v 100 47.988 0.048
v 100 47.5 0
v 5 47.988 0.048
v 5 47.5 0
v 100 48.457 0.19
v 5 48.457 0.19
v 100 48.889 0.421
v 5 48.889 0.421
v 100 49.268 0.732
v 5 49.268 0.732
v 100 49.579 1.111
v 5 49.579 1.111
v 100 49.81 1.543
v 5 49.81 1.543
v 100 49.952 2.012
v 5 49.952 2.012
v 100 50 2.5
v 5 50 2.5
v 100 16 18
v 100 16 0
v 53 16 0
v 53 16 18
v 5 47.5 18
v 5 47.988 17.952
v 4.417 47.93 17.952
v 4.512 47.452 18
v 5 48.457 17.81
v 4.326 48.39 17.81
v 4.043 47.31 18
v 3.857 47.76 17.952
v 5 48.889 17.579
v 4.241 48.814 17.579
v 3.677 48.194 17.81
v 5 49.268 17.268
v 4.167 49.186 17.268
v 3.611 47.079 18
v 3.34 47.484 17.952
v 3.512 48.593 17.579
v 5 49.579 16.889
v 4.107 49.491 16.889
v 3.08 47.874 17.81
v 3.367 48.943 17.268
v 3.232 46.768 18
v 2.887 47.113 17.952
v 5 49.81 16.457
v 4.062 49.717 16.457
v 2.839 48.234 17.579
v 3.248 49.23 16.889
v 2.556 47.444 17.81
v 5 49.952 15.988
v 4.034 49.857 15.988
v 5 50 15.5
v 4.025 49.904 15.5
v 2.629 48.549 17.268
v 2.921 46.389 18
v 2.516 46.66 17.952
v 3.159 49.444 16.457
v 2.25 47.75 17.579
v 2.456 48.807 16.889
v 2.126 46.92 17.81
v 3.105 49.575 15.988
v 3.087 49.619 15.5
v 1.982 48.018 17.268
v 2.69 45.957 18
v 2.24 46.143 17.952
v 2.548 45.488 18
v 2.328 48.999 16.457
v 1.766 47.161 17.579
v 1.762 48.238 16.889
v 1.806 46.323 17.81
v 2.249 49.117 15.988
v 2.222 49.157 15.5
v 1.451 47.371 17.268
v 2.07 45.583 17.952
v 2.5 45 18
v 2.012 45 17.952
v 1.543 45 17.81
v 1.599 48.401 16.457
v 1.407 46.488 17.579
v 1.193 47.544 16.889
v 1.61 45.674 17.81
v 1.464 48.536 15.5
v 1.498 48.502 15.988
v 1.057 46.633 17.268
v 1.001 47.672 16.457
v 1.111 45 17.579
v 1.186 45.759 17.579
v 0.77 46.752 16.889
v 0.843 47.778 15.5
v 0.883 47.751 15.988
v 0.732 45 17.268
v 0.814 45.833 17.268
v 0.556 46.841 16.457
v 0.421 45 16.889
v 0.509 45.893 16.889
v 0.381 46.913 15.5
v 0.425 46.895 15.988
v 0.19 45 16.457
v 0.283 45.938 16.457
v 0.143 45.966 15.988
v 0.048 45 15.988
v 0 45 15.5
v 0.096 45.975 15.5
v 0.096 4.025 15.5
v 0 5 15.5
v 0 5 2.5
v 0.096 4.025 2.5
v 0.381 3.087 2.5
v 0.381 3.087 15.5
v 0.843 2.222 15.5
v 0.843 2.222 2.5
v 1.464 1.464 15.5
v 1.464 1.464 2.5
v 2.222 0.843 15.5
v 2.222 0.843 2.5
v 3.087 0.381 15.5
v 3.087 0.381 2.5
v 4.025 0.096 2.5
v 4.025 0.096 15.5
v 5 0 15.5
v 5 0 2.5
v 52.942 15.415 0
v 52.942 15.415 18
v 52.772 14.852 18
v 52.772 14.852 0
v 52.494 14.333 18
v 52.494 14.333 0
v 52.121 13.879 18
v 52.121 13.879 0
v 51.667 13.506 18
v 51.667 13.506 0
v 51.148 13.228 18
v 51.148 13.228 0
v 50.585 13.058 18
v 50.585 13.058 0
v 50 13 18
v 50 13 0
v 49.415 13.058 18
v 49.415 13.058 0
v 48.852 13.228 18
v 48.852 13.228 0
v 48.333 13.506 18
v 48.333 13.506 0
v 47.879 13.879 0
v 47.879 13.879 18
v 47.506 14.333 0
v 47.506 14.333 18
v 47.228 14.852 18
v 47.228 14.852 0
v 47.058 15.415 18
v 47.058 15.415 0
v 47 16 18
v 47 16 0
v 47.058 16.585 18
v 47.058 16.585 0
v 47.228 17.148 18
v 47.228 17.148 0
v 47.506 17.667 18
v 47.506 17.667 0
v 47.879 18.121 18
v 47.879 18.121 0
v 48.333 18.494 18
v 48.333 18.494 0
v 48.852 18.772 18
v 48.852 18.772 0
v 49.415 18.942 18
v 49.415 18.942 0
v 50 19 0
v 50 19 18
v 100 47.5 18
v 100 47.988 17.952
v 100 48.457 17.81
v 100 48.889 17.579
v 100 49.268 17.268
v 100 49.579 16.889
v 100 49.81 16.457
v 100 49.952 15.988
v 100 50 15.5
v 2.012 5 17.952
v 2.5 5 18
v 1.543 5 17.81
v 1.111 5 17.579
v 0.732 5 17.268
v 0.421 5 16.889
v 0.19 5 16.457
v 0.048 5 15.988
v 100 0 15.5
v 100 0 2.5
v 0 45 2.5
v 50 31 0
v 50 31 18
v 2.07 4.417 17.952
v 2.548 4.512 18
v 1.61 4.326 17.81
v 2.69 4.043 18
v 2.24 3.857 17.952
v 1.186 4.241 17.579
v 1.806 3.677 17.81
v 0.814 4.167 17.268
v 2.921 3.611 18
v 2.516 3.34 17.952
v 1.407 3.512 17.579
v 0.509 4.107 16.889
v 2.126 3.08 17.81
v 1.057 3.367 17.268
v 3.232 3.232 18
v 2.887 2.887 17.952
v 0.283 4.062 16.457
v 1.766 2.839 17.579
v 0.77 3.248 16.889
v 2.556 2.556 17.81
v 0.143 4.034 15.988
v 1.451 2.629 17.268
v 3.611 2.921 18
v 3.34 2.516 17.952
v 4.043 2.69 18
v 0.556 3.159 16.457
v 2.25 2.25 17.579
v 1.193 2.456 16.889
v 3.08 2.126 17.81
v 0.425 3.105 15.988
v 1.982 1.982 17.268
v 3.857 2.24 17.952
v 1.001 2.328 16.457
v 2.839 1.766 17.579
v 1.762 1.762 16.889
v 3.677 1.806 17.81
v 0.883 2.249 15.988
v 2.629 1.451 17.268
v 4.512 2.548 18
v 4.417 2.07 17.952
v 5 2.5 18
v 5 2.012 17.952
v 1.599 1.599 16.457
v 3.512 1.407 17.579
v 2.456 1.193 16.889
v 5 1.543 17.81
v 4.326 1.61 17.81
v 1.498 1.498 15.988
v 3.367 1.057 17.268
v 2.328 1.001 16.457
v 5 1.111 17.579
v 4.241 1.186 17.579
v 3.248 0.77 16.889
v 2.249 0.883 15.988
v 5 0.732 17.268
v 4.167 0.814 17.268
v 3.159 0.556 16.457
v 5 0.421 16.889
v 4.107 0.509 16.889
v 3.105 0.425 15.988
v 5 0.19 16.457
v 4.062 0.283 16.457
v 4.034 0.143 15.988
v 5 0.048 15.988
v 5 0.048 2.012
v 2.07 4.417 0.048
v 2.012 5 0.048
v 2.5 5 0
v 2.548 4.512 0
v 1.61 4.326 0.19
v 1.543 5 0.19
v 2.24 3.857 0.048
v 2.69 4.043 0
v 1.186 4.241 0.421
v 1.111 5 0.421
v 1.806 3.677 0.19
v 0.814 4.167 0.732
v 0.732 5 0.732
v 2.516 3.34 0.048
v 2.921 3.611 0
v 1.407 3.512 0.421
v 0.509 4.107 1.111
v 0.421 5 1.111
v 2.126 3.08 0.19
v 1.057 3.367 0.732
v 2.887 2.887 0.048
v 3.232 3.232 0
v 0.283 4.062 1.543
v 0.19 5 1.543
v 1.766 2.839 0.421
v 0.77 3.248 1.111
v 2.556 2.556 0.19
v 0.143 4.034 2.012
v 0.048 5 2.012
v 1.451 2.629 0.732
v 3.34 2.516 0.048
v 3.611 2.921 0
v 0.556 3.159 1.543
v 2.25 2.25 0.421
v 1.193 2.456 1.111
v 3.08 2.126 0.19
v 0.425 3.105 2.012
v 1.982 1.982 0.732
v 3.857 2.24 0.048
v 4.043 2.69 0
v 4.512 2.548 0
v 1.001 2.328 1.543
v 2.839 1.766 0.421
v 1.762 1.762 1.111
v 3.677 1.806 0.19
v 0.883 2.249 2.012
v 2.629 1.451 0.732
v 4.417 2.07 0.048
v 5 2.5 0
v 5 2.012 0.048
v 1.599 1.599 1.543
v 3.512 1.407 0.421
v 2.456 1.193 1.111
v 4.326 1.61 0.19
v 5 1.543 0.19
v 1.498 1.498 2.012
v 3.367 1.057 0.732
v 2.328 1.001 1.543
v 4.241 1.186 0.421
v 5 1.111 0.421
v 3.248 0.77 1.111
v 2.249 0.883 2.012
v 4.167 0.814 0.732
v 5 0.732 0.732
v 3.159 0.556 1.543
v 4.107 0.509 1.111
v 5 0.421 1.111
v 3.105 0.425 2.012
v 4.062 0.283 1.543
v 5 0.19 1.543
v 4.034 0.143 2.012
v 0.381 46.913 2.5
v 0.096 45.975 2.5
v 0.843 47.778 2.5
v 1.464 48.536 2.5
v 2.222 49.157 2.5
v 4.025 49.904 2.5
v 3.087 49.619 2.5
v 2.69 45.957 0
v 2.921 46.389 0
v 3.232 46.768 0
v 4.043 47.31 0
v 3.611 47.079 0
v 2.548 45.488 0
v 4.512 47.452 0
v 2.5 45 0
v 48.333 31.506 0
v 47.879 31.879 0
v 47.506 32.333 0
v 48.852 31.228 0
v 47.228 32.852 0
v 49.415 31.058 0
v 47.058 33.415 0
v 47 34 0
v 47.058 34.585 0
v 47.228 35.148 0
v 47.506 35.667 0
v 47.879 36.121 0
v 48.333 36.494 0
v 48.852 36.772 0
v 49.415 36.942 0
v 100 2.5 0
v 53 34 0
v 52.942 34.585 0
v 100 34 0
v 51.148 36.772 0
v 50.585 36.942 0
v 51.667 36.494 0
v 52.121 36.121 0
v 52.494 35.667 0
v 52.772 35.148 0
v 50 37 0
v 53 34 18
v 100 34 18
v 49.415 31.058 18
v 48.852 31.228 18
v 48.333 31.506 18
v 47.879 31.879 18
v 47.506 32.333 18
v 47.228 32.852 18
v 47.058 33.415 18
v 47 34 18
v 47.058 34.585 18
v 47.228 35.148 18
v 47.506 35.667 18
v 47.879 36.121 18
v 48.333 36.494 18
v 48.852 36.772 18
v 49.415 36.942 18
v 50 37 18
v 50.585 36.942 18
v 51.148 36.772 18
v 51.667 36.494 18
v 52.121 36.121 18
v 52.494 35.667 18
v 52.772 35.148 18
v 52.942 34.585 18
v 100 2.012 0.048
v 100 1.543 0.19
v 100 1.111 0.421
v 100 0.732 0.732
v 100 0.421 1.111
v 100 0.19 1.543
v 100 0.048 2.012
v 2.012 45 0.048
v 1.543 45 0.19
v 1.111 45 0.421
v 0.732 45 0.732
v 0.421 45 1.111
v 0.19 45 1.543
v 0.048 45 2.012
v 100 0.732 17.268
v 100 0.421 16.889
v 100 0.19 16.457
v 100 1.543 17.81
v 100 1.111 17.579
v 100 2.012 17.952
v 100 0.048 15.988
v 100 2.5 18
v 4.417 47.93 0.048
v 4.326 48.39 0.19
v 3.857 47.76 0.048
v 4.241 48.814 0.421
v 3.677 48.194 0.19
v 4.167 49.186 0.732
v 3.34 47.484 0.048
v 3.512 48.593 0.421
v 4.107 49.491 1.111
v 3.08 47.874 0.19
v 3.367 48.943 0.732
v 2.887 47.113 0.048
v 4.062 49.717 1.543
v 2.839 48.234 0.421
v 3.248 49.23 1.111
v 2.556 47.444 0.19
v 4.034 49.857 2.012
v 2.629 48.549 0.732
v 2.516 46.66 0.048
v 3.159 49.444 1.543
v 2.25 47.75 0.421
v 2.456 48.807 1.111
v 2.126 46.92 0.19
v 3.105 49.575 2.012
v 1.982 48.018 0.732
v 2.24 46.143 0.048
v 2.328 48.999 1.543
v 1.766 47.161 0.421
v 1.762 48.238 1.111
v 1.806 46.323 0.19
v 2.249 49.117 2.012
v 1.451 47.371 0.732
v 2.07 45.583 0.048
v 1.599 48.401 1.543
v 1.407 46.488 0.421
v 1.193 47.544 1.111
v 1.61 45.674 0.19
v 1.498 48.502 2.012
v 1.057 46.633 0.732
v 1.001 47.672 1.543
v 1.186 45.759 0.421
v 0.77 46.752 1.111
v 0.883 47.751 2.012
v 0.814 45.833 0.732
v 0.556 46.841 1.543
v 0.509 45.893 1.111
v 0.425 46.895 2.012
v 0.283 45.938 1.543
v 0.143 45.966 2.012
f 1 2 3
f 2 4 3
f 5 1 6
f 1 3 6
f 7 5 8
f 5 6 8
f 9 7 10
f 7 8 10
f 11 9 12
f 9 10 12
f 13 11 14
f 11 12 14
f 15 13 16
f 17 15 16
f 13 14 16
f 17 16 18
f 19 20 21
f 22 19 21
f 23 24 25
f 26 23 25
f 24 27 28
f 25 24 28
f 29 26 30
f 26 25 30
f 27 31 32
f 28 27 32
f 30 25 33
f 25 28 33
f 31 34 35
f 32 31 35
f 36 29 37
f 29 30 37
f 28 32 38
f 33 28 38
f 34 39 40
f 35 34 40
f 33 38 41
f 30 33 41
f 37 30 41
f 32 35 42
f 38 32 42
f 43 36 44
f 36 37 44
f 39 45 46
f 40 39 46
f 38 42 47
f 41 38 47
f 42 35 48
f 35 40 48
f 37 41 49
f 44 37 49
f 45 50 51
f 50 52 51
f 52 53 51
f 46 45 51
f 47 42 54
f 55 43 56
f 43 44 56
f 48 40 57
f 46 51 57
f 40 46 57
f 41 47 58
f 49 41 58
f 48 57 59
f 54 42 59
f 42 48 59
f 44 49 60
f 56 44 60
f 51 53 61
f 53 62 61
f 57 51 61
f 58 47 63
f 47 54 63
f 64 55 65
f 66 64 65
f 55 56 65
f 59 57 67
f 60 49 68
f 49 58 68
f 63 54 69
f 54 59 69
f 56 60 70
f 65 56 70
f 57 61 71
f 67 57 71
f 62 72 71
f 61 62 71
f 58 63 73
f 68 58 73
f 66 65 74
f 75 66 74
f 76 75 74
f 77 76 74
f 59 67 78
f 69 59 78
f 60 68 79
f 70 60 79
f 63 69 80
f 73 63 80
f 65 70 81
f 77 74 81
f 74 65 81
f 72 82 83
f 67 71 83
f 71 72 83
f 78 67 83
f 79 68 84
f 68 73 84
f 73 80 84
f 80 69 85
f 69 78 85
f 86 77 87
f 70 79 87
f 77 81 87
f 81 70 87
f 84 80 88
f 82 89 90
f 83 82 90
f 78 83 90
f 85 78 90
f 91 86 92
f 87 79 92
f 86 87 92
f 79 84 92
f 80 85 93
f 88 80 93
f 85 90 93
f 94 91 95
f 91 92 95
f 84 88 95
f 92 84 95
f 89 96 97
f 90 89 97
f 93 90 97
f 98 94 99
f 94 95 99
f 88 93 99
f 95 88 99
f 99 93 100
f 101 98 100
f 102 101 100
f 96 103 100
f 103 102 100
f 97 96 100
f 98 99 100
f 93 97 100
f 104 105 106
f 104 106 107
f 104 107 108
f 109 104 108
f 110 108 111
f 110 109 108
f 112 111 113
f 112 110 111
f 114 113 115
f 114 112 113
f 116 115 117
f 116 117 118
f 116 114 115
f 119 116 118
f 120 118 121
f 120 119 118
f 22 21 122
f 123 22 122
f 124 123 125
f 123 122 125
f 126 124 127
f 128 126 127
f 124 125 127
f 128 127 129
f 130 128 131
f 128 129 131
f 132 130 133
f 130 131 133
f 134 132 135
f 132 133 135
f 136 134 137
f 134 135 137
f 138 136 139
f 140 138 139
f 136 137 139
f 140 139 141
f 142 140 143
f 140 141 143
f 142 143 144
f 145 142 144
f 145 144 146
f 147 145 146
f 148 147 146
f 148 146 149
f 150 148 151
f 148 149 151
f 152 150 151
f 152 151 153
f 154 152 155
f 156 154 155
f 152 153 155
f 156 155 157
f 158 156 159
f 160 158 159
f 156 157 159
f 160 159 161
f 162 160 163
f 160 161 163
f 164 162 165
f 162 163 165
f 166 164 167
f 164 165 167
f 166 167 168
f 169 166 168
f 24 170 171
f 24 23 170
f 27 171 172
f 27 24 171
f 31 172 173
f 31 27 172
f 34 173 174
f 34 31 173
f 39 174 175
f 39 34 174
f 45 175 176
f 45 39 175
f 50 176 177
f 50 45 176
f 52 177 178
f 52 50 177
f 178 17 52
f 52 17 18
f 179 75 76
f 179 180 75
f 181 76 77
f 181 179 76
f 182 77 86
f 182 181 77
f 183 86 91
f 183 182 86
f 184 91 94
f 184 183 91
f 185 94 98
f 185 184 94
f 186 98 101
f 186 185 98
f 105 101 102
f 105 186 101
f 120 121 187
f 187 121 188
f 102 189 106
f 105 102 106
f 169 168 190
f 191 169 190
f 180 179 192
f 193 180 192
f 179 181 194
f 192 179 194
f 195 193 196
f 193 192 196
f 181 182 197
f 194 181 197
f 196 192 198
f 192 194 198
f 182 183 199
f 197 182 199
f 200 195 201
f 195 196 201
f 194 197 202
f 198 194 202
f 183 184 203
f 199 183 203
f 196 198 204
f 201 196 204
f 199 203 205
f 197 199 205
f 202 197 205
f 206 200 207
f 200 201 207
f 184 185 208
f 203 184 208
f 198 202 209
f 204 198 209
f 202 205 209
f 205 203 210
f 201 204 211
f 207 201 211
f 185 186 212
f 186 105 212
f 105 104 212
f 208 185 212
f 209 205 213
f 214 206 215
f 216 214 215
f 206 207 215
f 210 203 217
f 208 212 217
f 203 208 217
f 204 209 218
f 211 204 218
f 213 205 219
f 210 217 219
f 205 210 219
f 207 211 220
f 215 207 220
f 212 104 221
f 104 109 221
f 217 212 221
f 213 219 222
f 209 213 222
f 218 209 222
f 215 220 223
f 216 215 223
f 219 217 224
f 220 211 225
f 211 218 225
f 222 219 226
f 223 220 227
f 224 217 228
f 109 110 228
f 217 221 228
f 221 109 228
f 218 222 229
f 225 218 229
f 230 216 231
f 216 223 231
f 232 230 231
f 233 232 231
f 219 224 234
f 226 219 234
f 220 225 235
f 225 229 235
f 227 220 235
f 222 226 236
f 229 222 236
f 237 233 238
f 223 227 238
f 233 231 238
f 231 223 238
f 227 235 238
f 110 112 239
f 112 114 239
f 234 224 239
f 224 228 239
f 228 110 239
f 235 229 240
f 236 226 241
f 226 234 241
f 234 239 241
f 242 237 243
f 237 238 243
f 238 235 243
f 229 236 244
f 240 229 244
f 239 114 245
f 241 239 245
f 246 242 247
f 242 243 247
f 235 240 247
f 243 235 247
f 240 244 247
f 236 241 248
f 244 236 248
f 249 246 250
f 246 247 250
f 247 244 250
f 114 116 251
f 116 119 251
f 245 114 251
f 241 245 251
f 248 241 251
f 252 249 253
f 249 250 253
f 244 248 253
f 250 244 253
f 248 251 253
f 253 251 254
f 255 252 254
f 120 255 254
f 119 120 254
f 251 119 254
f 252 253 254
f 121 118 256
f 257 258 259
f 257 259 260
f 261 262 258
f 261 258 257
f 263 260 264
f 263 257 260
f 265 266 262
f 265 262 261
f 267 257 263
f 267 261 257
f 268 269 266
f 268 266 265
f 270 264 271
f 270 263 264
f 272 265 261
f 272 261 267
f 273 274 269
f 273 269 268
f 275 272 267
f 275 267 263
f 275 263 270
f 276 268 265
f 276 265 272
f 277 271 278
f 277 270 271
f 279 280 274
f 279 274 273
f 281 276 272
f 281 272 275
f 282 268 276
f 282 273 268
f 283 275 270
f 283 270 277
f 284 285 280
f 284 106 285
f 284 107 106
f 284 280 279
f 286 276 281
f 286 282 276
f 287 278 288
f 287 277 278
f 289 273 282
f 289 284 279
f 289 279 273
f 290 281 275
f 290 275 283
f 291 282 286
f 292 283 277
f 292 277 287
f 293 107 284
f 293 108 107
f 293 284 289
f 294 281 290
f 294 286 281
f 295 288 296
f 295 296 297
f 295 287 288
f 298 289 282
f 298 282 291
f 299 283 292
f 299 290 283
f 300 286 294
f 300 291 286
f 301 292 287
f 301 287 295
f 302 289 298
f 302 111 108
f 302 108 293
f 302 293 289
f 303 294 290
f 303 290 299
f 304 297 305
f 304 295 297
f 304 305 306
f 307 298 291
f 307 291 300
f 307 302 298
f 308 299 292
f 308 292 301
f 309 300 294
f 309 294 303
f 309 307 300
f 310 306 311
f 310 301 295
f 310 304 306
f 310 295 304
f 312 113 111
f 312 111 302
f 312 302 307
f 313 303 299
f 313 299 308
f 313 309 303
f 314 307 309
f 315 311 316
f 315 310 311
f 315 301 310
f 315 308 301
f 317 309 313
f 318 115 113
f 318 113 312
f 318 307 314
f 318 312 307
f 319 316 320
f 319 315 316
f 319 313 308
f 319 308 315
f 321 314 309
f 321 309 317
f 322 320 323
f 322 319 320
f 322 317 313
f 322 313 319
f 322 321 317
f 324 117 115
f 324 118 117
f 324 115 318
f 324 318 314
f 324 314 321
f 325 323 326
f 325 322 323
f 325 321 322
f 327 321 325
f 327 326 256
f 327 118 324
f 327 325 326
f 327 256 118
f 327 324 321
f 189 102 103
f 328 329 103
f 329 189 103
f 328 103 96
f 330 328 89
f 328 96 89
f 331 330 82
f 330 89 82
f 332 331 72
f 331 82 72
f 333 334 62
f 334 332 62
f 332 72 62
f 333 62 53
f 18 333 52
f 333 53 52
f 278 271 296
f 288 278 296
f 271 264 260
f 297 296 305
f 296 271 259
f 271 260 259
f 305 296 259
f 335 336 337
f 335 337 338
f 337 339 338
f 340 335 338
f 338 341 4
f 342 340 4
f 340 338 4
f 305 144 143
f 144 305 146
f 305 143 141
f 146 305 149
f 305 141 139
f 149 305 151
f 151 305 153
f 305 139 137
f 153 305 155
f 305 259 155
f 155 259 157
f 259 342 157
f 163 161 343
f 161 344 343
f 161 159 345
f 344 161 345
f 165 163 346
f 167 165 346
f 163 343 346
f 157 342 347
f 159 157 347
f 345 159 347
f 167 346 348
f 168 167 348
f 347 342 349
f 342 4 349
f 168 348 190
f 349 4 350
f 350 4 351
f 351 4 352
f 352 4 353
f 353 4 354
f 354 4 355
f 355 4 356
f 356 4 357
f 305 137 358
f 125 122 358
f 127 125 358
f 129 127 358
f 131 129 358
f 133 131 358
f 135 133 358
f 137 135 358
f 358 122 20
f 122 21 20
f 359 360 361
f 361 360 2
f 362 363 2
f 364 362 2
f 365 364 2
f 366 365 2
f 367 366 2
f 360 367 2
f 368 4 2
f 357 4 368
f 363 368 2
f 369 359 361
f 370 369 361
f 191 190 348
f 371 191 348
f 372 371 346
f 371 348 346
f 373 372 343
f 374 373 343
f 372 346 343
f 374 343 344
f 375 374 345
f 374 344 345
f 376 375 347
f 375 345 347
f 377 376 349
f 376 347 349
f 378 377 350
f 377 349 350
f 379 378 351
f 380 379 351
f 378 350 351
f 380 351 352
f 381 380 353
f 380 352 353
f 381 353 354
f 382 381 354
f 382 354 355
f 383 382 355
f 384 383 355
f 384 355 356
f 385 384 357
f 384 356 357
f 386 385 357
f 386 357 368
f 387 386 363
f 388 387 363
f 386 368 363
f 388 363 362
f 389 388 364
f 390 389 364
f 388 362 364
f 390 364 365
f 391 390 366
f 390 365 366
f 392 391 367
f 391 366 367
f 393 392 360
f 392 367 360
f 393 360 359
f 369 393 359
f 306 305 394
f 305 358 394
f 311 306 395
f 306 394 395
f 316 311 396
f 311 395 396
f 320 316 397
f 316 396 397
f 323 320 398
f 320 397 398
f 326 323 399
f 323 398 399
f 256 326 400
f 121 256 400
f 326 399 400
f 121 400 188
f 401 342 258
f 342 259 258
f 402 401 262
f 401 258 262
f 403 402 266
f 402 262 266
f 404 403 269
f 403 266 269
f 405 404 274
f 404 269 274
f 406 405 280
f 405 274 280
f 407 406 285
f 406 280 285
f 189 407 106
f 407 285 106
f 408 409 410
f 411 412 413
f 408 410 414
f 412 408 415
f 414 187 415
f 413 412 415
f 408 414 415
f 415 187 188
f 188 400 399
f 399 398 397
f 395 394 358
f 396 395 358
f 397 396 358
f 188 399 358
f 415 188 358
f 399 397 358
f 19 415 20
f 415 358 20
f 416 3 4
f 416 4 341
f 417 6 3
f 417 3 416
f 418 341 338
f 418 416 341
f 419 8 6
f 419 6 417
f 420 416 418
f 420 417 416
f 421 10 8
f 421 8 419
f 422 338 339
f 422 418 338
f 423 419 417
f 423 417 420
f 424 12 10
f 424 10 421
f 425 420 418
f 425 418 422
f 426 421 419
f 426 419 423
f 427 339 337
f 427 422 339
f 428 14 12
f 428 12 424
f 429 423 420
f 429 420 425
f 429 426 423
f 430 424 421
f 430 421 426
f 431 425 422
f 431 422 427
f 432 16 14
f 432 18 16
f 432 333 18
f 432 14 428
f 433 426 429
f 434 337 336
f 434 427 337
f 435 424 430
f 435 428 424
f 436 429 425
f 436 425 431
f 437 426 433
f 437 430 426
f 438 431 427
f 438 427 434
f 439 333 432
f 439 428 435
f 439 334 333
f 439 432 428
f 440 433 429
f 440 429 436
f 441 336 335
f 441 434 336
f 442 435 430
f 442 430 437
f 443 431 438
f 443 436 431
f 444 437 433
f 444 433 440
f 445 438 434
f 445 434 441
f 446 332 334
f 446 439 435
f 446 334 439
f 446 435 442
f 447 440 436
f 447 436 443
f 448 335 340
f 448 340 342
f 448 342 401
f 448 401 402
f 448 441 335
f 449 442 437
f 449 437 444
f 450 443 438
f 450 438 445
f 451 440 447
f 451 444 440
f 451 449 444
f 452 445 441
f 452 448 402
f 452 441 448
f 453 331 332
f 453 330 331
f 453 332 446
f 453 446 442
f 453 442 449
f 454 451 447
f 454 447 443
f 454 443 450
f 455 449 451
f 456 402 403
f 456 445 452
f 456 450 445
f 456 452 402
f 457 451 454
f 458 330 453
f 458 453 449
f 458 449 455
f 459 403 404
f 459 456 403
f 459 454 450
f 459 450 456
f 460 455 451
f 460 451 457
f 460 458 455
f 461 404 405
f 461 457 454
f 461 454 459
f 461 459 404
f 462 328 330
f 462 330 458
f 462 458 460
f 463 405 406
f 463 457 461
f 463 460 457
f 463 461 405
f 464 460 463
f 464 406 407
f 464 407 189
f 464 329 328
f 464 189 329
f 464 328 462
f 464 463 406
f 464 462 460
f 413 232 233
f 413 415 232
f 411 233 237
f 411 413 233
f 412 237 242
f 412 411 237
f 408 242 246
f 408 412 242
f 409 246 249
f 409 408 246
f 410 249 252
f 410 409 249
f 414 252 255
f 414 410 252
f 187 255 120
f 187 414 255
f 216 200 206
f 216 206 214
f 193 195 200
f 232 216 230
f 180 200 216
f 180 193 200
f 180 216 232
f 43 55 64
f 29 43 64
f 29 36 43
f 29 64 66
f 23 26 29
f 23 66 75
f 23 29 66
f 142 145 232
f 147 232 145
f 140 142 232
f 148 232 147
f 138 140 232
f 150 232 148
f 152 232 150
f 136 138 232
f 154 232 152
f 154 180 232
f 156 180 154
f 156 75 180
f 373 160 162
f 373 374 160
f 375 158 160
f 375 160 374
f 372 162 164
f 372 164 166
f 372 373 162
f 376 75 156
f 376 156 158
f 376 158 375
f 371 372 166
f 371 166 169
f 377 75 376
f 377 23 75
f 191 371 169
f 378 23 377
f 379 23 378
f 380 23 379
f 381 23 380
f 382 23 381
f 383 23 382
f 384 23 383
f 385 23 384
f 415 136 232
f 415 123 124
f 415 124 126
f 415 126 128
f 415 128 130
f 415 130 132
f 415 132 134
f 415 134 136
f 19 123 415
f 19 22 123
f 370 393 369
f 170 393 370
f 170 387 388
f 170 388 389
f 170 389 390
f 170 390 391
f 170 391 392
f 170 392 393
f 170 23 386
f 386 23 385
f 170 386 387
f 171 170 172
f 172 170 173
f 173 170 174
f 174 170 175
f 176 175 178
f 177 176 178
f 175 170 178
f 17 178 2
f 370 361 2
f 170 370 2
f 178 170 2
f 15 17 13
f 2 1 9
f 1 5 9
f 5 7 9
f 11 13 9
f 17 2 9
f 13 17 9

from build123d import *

# Parameters (mm, degrees)
F1_DEPTH = 18
F2_R     = 5
F3_R     = 2.5


with BuildPart() as f1:
    # F0 (on Top) → F1 (new body)
    with BuildSketch(Plane.XY):
        with BuildLine():
            Line((0, 50), (0, 0))
            Line((0, 0), (100, 0))
            Line((100, 0), (100, 16))
            Line((100, 16), (53, 16))
            ThreePointArc((53, 16), (47.87868, 13.87868), (50, 19))
            Line((50, 19), (50, 31))
            ThreePointArc((50, 31), (47.87868, 36.12132), (53, 34))
            Line((53, 34), (100, 34))
            Line((100, 34), (100, 50))
            Line((100, 50), (0, 50))
        make_face()
    extrude(amount=F1_DEPTH)

    # F2
    f2_edges = [f1.edges().sort_by_distance(p)[0] for p in [
        (0, 0, 9),
        (0, 50, 9),
    ]]
    fillet(f2_edges, radius=F2_R)

    # F3
    f3_edges = [f1.edges().sort_by_distance(p)[0] for p in [
        (52.5, 0, 18),
        (52.5, 0, 0),
    ]]
    fillet(f3_edges, radius=F3_R)


solid = f1.part
